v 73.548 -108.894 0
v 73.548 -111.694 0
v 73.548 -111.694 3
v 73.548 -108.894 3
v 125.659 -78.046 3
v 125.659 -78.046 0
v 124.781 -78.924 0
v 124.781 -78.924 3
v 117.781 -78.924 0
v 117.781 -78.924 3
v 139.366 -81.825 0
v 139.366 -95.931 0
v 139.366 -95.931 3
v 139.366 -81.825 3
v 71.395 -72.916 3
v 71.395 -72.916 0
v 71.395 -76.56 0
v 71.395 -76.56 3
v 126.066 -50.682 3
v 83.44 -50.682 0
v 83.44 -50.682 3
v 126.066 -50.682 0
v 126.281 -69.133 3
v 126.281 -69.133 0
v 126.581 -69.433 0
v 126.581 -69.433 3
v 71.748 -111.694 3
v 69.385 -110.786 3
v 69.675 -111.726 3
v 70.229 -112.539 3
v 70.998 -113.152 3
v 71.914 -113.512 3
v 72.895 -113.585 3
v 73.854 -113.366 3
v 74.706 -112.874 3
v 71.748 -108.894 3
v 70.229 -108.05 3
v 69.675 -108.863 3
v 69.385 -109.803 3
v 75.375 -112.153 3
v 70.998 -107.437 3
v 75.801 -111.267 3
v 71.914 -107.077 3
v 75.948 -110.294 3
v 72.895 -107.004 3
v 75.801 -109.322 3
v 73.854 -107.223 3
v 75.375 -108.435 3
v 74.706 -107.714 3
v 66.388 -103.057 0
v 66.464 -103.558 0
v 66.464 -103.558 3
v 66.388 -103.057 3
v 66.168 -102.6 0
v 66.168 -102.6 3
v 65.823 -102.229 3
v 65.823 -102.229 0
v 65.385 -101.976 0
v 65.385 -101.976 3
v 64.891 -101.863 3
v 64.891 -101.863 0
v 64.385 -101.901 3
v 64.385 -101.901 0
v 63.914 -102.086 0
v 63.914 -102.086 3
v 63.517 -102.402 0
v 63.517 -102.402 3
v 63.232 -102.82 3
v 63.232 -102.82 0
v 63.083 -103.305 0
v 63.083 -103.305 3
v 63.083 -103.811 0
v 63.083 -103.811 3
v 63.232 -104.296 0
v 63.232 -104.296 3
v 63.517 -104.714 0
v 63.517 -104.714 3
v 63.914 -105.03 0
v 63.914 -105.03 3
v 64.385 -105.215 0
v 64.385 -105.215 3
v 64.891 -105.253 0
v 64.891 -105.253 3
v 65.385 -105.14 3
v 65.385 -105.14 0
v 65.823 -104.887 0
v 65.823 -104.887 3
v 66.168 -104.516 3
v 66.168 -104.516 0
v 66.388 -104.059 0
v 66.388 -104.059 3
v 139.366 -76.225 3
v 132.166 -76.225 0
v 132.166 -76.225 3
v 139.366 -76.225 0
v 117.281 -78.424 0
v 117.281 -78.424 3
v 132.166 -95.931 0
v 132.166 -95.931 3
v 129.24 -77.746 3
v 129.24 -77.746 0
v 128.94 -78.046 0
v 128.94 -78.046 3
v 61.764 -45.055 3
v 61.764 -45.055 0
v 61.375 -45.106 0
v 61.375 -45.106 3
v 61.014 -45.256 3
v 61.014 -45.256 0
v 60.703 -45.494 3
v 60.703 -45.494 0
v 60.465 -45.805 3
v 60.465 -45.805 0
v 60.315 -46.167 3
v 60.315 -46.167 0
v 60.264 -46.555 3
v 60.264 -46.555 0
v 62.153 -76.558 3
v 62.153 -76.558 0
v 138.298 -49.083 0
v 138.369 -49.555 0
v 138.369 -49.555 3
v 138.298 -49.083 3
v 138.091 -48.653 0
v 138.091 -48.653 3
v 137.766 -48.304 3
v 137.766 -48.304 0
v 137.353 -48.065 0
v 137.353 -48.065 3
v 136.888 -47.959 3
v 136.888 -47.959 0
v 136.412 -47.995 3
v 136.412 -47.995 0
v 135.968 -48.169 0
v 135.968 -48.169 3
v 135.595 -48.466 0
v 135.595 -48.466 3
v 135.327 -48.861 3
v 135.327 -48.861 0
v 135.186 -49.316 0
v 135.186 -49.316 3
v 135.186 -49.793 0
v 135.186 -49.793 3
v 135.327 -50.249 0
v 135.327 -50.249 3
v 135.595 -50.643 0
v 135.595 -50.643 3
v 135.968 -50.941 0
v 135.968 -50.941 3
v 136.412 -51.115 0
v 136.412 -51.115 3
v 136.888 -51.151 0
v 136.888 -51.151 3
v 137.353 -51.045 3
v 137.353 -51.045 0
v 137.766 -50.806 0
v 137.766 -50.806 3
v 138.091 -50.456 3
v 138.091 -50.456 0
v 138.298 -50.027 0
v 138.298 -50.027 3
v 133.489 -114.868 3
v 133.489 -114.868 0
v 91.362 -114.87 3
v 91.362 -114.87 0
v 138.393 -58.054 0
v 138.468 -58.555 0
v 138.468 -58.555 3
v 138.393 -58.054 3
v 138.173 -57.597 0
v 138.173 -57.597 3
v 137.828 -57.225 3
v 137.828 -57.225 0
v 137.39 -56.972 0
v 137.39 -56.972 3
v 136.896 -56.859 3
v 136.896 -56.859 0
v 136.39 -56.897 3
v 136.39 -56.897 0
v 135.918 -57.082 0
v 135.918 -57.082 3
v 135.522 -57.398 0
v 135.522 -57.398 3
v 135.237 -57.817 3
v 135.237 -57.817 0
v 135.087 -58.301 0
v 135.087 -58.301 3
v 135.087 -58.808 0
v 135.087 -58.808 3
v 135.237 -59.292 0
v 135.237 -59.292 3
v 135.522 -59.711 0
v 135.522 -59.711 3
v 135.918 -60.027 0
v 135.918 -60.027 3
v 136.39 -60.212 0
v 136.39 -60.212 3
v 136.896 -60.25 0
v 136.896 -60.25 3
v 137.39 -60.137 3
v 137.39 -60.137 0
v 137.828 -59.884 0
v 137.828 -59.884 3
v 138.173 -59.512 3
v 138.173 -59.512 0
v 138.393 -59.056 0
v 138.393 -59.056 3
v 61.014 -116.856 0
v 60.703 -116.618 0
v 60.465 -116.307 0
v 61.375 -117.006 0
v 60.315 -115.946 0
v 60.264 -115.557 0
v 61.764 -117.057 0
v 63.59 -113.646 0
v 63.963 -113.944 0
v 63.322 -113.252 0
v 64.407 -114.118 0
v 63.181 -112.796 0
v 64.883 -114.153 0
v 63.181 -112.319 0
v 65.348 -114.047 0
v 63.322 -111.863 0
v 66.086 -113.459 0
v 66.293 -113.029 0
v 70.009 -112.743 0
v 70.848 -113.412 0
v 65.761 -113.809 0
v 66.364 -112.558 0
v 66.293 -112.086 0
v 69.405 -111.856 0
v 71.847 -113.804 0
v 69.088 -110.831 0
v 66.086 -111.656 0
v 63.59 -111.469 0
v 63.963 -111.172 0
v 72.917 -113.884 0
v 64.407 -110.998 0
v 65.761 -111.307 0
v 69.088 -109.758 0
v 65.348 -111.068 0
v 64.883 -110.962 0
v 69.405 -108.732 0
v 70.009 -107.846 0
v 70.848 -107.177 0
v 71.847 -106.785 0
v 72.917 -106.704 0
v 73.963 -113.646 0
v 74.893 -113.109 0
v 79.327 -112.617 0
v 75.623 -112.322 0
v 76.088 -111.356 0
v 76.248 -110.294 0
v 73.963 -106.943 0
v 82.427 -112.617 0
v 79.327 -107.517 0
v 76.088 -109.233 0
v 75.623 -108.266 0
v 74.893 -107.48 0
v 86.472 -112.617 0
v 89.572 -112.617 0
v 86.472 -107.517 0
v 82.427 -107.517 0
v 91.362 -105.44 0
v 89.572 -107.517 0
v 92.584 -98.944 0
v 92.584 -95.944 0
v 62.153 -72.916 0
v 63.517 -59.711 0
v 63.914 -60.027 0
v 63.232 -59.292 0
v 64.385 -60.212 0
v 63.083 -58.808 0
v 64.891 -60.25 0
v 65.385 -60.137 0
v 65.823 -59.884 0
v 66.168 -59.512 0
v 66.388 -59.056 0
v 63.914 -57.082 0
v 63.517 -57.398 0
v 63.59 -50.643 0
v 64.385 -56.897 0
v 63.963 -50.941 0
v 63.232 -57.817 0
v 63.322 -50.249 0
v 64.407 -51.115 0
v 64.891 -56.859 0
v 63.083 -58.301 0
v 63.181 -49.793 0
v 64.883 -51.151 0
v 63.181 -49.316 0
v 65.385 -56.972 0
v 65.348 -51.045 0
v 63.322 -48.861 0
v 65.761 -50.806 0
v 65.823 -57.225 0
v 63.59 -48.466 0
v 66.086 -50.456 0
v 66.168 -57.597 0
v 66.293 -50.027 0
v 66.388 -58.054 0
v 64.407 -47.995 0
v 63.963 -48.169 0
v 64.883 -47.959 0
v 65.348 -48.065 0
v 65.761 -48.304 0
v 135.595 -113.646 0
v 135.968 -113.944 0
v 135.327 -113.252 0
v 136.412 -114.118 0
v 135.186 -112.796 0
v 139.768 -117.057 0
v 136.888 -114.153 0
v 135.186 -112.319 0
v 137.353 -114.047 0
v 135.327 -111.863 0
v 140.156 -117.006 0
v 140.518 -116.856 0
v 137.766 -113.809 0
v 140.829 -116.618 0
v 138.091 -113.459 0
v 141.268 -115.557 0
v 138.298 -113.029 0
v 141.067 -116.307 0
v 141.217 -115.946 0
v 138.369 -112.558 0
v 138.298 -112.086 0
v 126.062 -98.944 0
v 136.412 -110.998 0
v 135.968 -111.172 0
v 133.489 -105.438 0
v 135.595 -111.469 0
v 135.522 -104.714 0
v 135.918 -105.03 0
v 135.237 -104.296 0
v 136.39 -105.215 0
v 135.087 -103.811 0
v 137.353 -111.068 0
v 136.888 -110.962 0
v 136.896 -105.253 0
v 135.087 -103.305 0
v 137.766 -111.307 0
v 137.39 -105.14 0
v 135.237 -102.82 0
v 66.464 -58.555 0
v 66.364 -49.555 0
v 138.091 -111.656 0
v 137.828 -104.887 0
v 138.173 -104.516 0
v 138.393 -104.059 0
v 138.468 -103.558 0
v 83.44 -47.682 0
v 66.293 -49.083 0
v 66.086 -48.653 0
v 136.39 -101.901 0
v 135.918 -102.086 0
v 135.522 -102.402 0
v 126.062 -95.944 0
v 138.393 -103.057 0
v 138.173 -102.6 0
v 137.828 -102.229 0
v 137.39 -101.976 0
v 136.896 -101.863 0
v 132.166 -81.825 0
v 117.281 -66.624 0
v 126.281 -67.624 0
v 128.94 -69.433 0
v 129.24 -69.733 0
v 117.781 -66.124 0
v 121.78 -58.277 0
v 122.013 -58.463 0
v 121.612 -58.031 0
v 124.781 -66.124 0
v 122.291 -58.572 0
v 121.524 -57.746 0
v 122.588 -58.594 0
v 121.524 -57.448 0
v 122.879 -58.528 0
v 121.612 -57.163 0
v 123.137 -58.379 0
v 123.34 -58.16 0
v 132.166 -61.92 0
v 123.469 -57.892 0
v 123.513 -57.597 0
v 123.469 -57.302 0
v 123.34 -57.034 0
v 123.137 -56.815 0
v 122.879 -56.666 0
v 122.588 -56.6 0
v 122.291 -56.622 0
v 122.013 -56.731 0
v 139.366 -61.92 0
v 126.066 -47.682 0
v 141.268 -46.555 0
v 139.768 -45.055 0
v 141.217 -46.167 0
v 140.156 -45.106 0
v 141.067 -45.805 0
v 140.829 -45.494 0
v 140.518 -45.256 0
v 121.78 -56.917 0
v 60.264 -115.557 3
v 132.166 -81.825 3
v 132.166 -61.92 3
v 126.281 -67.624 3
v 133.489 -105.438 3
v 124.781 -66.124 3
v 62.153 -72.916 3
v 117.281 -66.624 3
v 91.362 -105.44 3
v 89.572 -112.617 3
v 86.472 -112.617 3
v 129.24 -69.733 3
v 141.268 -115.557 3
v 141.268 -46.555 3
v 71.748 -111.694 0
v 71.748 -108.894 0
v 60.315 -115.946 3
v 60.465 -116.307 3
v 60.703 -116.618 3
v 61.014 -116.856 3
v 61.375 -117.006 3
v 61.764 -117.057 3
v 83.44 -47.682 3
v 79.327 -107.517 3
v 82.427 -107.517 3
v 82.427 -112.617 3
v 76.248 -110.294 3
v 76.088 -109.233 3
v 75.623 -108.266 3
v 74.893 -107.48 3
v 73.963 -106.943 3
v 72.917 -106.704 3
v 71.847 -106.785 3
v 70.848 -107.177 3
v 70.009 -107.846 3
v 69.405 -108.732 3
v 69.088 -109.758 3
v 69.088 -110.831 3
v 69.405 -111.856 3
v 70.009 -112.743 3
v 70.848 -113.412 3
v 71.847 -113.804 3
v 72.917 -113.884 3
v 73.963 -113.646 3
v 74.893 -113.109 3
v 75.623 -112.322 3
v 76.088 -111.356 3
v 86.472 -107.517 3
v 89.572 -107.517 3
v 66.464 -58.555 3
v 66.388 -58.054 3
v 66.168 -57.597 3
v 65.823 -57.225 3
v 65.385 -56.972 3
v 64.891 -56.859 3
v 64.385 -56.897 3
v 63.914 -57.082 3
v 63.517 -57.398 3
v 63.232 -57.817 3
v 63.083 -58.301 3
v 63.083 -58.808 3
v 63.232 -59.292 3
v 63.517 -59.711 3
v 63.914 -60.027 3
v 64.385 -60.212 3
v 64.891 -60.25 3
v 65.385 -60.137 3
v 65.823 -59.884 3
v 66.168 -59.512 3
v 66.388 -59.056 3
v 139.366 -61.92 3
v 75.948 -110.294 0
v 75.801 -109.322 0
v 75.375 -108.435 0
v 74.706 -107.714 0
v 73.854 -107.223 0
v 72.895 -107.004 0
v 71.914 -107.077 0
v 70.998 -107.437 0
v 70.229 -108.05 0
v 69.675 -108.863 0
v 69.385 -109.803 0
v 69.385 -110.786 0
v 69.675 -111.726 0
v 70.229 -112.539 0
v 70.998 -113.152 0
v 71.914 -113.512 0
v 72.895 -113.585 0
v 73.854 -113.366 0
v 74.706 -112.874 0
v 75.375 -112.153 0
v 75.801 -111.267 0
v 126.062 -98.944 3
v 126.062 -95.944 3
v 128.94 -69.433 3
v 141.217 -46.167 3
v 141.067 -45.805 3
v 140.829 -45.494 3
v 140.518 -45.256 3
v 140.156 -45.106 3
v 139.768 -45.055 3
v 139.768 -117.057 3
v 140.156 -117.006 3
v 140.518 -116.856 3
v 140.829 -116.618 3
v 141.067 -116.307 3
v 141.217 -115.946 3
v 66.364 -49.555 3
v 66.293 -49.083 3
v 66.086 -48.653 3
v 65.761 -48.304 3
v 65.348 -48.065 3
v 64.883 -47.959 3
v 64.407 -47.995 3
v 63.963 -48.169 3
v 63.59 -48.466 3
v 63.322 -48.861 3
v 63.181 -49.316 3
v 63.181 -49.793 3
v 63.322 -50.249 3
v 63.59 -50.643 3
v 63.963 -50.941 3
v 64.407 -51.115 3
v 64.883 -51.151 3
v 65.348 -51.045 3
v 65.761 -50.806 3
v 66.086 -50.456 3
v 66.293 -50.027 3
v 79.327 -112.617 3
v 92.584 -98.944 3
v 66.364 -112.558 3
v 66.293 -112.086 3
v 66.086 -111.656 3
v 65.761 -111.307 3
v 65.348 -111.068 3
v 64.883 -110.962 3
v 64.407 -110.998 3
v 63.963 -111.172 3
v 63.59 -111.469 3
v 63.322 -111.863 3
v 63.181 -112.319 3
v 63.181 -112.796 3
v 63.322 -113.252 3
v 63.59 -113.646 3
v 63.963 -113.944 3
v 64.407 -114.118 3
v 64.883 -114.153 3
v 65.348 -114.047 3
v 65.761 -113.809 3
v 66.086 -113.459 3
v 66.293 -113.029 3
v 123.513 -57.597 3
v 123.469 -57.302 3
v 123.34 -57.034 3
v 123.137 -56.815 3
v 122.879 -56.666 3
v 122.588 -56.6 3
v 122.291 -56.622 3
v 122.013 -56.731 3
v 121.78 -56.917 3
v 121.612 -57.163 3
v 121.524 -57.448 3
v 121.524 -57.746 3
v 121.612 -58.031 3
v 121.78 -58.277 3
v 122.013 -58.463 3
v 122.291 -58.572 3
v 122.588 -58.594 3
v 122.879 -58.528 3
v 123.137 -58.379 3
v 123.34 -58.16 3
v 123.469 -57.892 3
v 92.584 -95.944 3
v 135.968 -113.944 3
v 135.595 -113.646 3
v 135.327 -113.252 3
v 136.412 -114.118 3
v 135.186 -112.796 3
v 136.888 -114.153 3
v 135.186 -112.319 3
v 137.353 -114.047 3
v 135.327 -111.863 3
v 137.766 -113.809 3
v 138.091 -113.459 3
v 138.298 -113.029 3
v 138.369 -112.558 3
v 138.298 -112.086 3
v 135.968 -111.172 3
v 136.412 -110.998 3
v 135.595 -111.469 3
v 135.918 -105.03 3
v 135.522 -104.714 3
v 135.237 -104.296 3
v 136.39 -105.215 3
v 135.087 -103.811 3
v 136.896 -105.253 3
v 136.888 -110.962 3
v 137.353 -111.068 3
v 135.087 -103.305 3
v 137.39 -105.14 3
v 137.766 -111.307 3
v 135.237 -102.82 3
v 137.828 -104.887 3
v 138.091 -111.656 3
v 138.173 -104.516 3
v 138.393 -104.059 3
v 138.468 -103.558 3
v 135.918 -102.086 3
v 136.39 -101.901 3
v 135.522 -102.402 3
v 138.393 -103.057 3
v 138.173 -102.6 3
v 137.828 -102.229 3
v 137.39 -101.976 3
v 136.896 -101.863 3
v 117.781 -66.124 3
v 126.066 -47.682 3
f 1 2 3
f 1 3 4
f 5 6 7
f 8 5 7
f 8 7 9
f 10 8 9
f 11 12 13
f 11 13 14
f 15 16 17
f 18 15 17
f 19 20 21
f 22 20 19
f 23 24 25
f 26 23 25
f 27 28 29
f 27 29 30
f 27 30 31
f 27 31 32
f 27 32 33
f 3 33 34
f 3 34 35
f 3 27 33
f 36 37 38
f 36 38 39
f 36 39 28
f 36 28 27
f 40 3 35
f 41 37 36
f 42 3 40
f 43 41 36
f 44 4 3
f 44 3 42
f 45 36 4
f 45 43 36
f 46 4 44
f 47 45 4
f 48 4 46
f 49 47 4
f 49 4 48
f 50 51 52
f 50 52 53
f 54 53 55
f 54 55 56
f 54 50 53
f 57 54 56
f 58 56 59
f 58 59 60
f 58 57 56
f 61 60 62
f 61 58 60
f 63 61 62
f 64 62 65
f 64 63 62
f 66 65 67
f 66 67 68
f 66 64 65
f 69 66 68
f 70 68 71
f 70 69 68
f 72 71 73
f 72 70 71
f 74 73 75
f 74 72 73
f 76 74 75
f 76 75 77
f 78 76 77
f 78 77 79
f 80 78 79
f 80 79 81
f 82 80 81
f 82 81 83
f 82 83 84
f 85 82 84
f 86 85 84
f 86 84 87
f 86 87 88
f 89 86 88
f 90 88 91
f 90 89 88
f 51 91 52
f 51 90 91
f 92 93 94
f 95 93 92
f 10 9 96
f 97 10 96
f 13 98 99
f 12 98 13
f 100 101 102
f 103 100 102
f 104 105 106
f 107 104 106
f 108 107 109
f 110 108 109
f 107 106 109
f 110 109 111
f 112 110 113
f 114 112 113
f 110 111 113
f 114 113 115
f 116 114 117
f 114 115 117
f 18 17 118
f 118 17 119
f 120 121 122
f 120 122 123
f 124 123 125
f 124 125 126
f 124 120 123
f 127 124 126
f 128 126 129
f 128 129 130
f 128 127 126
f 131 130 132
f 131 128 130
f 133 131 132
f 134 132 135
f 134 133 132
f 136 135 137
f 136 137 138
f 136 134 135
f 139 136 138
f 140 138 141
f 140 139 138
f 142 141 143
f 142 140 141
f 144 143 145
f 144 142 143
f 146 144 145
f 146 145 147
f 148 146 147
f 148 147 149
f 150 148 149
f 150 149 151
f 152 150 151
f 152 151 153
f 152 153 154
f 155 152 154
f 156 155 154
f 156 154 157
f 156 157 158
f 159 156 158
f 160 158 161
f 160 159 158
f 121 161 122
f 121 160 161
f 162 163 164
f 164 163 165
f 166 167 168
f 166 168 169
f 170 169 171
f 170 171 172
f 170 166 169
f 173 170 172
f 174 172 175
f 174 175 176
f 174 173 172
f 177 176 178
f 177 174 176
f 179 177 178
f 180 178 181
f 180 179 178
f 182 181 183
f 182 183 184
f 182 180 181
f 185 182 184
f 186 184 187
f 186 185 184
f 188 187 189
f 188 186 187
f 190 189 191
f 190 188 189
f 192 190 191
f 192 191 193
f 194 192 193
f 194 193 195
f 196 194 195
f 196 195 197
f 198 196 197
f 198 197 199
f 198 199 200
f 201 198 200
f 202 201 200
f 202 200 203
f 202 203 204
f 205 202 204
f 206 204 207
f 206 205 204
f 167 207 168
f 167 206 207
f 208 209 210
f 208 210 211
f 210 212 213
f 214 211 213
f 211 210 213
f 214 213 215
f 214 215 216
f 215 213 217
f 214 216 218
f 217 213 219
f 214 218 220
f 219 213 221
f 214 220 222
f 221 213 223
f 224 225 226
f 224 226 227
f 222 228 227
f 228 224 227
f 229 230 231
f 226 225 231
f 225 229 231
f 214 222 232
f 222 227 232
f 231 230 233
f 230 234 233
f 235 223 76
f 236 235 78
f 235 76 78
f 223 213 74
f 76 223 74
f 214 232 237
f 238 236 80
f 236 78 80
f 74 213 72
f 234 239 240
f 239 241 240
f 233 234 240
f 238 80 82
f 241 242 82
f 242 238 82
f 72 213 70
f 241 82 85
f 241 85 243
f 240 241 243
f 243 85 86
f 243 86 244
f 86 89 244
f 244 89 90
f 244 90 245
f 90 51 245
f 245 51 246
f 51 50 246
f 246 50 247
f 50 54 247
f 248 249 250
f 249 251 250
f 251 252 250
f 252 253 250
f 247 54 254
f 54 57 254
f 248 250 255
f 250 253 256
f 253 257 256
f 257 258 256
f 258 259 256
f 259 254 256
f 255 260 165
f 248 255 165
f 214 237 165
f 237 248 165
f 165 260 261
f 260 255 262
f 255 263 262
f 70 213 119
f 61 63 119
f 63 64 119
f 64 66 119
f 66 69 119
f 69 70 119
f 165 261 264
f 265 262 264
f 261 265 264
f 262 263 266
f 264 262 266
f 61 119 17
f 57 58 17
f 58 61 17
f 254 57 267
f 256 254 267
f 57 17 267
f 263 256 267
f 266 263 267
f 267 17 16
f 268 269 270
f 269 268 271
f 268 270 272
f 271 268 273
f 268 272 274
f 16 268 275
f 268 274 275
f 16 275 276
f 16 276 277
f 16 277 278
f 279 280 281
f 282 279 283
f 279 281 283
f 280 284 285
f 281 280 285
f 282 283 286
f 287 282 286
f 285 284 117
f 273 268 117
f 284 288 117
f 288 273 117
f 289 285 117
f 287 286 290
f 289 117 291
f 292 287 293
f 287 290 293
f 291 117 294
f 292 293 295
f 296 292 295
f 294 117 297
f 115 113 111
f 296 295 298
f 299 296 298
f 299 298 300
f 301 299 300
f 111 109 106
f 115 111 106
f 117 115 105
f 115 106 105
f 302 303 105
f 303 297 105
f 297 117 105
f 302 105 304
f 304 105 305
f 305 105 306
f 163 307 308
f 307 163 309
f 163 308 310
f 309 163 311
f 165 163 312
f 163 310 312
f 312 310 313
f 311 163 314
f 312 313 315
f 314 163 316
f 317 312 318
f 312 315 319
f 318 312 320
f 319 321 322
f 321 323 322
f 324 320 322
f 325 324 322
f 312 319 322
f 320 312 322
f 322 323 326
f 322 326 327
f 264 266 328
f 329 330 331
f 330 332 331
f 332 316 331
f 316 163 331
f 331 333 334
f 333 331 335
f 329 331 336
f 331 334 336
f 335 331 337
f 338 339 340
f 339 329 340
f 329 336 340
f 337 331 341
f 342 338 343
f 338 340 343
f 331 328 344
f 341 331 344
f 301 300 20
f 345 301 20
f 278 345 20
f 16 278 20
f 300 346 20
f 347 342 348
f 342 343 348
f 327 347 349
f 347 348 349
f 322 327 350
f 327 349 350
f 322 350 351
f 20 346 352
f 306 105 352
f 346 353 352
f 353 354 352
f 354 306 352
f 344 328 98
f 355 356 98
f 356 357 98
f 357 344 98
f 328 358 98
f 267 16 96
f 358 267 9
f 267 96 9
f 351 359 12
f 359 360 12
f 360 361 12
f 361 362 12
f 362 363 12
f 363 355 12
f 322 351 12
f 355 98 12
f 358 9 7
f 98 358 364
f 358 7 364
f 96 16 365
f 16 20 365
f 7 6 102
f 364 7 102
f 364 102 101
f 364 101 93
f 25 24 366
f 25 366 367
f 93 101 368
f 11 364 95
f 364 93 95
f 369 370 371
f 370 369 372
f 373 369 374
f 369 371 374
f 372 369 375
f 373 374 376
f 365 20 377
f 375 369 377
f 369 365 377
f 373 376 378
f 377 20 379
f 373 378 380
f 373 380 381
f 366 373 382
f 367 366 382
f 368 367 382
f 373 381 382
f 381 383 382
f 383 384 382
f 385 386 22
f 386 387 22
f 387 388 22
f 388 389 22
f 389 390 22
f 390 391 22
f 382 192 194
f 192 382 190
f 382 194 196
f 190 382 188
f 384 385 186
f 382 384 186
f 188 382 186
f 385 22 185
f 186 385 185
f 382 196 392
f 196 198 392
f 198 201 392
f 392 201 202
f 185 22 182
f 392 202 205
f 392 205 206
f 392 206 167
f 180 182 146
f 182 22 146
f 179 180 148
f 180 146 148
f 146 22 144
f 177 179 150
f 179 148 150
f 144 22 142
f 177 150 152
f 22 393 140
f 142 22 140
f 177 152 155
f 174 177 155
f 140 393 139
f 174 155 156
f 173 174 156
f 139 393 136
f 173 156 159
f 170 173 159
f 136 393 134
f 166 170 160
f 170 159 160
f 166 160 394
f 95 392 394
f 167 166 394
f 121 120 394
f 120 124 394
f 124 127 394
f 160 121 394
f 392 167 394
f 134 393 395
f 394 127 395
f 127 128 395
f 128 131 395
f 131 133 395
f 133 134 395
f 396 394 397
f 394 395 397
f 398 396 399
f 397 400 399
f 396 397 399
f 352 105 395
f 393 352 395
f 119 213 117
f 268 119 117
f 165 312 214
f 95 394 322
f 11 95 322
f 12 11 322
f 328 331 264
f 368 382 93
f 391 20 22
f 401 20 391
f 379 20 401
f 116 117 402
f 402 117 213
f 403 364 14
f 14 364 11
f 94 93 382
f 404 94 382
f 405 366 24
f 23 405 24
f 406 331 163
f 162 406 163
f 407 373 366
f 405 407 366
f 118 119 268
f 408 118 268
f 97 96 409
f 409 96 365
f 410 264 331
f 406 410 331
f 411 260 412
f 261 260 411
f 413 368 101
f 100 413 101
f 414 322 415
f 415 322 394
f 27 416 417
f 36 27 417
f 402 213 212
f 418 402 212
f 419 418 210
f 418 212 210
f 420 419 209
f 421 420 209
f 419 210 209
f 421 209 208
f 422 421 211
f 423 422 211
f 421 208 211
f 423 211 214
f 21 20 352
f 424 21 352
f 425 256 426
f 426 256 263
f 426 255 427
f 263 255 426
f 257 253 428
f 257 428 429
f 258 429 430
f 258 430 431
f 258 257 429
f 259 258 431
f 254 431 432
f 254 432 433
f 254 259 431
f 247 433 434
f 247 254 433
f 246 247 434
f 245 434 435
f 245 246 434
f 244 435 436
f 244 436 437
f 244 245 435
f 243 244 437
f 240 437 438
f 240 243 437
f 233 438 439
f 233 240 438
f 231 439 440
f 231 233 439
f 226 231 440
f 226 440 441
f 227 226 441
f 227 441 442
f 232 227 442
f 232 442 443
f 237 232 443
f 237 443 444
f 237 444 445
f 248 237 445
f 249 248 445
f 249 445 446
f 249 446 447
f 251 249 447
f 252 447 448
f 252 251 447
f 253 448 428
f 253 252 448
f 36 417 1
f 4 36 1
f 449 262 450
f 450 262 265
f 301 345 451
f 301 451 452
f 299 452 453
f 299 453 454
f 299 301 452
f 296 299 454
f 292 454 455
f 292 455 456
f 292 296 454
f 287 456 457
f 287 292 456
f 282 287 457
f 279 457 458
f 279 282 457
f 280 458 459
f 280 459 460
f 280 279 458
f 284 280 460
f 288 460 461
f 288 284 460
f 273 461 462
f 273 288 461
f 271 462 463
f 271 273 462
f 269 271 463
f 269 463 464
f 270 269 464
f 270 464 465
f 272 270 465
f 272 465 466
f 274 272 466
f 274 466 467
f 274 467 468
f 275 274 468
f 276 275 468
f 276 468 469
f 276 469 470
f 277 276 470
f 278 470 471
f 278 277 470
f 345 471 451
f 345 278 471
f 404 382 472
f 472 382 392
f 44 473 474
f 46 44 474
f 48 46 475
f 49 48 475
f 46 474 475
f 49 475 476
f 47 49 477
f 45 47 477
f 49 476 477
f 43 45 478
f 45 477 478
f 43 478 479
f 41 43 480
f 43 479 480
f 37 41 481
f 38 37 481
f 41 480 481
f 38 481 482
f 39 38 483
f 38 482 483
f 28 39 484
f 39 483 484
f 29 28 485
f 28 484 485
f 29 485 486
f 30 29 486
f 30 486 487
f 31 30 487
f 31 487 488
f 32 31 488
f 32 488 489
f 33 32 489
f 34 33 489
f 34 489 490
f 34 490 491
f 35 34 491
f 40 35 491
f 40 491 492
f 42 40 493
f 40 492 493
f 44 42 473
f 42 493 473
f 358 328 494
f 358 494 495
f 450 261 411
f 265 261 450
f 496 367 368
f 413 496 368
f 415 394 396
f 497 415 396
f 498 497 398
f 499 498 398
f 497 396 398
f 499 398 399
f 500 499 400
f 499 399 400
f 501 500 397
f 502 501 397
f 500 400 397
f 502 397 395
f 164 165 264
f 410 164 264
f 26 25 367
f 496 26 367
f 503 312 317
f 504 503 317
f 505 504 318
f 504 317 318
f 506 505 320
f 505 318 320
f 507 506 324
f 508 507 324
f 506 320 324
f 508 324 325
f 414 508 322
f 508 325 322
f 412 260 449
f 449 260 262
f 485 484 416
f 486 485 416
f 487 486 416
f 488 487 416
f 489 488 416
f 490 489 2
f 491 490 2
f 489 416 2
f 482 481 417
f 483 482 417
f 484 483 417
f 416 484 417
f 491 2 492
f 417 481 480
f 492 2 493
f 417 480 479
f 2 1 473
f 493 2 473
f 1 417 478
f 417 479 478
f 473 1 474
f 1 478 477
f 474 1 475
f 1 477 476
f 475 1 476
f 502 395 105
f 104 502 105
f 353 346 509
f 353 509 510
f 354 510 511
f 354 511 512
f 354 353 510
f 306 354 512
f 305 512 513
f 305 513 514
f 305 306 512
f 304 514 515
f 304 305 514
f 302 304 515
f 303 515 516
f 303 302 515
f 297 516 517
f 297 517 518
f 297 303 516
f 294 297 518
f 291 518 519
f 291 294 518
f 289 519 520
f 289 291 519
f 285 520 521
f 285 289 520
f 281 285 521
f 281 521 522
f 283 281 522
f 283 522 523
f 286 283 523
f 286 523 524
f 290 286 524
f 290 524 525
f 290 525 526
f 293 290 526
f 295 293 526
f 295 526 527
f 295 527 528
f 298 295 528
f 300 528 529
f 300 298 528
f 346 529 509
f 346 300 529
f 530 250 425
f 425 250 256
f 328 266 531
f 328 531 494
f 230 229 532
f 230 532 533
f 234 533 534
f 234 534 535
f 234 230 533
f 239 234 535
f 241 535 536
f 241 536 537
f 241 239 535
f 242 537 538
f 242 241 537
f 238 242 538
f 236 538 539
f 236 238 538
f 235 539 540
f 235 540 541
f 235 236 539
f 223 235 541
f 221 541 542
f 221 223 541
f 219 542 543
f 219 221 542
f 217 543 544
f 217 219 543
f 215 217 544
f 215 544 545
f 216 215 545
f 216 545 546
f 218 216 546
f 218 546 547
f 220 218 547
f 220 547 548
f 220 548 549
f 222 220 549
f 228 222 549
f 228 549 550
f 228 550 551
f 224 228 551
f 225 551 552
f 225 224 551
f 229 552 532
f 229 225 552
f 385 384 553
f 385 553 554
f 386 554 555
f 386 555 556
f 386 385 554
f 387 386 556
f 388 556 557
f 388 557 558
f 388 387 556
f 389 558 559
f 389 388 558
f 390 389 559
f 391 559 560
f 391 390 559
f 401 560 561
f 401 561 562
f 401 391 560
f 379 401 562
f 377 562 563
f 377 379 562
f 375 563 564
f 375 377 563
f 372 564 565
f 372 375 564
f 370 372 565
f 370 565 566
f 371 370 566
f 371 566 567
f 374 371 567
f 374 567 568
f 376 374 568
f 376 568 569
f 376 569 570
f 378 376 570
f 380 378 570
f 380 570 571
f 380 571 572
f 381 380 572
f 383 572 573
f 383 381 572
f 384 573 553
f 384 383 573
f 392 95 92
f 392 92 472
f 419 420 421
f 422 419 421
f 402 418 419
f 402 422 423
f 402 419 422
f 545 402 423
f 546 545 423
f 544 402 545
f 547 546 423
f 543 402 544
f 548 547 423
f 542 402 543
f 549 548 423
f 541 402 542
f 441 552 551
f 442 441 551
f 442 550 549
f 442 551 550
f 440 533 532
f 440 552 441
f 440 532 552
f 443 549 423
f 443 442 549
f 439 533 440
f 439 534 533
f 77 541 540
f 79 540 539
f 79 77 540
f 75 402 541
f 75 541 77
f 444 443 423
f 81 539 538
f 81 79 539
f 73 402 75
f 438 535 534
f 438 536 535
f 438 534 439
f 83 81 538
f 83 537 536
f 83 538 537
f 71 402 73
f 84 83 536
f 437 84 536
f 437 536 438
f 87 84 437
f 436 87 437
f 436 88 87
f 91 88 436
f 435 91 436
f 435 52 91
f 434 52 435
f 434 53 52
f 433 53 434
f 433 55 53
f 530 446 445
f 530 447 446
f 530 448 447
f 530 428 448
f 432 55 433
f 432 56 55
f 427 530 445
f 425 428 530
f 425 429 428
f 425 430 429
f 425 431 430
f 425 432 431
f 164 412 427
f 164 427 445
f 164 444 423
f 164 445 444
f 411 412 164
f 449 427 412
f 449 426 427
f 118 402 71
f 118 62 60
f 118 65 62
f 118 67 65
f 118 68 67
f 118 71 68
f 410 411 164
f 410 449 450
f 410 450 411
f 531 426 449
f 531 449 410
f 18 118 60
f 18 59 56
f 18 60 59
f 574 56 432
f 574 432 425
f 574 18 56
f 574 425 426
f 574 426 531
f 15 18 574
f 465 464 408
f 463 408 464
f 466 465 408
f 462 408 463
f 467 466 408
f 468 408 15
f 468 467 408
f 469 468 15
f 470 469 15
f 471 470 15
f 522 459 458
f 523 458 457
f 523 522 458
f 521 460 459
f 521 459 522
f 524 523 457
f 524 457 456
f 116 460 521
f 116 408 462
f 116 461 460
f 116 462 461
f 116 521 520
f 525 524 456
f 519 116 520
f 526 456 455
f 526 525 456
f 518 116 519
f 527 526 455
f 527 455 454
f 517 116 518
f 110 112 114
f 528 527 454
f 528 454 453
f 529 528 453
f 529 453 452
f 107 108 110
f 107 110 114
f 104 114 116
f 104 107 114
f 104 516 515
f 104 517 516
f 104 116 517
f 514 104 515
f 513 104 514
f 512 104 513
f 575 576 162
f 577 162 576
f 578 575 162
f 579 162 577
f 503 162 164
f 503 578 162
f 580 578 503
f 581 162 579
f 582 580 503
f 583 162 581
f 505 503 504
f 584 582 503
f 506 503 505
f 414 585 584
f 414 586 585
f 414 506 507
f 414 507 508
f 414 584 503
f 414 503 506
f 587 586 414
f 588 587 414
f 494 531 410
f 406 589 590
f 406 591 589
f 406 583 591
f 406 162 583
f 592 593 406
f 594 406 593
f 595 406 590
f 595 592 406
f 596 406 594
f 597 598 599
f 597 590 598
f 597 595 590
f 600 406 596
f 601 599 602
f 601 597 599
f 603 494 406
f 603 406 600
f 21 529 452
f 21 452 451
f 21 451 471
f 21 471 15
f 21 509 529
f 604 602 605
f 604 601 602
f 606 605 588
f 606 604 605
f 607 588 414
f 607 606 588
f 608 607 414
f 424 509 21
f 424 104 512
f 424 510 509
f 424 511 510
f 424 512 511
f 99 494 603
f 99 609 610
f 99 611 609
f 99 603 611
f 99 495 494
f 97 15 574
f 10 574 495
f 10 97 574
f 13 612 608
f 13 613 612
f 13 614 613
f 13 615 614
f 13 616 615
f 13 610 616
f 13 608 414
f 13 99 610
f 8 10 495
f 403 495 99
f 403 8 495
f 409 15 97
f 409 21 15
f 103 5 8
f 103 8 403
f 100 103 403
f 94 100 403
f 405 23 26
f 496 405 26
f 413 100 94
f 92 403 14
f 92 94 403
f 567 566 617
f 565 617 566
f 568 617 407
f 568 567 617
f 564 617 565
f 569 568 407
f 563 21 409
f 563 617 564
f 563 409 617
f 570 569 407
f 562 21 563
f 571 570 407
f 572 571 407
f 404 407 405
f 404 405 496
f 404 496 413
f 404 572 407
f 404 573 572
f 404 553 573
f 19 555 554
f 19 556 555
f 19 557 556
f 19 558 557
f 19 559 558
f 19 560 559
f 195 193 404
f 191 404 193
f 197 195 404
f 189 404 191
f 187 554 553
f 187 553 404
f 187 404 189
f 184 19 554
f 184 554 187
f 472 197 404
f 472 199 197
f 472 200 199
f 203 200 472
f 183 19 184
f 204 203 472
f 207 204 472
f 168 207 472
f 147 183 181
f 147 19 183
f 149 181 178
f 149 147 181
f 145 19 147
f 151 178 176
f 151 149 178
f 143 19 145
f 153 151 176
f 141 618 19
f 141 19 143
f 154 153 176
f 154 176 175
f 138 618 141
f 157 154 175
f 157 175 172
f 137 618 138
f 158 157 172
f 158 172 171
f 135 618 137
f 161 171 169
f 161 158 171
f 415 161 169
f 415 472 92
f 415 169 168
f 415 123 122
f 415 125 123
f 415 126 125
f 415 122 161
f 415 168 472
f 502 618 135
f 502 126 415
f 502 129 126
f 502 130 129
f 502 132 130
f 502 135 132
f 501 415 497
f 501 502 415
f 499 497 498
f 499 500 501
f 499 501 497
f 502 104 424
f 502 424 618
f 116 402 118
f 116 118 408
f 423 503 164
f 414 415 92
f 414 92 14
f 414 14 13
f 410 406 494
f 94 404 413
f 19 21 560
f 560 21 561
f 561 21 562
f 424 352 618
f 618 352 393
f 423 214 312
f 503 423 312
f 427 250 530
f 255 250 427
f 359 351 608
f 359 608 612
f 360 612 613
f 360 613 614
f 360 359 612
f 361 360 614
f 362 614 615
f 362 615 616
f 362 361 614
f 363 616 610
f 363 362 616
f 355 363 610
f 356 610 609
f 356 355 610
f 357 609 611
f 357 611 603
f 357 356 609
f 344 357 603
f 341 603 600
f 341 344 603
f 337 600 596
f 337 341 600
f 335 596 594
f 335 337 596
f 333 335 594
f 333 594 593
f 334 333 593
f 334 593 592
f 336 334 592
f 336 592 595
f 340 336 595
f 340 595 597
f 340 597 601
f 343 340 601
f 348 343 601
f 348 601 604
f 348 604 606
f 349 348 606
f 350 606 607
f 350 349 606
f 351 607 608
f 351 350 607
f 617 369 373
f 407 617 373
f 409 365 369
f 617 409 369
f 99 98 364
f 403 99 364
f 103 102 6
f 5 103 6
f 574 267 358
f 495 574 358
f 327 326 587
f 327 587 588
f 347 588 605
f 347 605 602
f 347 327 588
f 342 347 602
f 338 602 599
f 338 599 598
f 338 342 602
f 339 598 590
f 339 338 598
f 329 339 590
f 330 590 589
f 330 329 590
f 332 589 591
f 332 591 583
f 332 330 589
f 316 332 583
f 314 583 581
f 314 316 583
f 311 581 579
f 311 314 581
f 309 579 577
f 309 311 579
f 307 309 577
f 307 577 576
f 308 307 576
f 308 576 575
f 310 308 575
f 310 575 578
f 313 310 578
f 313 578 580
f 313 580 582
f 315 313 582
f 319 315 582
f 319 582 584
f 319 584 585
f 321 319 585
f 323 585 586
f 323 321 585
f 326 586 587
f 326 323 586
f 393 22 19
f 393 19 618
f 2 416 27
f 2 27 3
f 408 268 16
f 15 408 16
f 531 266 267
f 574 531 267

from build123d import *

# Parameters (mm, degrees)
MODEL_R                   = 1.600279216
MODEL_R_2                 = 3.6
MODEL_R_3                 = 1.7
MODEL_W                   = 3.1
MODEL_H                   = 5.1
MODEL_W_2                 = 33.477610829
MODEL_H_2                 = 3
MODEL_W_3                 = 7.19993206
MODEL_H_3                 = 14.105297
MODEL_H_4                 = 14.305297001
MODEL_W_4                 = 42.625961549
MODEL_R_4                 = 1
SALIENTE_EXTRUIR1_DEPTH   = 3
MODEL_R_5                 = 3.3
MODEL_W_5                 = 1.8
MODEL_H_5                 = 2.8
SALIENTE_EXTRUIR1_2_DEPTH = 3


with BuildPart() as part:
    # Model → Saliente-Extruir1 (new body)
    with BuildSketch(Plane.XY):
        with BuildLine():
            ThreePointArc((141.268153306, -46.554934941), (140.828813478, -45.494274769), (139.768153306, -45.054934941))
            Line((139.768153306, -45.054934941), (61.763543448, -45.054934941))
            ThreePointArc((61.763543448, -45.054934941), (60.702883276, -45.494274769), (60.263543448, -46.554934941))
            Line((60.263543448, -46.554934941), (60.263543448, -115.557339175))
            ThreePointArc((60.263543448, -115.557339175), (60.702883276, -116.617999347), (61.763543448, -117.057339175))
            Line((61.763543448, -117.057339175), (139.768153306, -117.057339175))
            ThreePointArc((139.768153306, -117.057339175), (140.828813478, -116.617999347), (141.268153306, -115.557339175))
            Line((141.268153306, -115.557339175), (141.268153306, -46.554934941))
        make_face()
        with Locations((64.763543448, -112.557673677)):
            Circle(MODEL_R, mode=Mode.SUBTRACT)
        with Locations((72.648093746, -110.294421642)):
            Circle(MODEL_R_2, mode=Mode.SUBTRACT)
        with Locations((64.763543448, -103.558008179)):
            Circle(MODEL_R_3, mode=Mode.SUBTRACT)
        with Locations((80.876831082, -110.067080389)):
            Rectangle(MODEL_W, MODEL_H, mode=Mode.SUBTRACT)
        with Locations((88.022204789, -110.067080389)):
            Rectangle(MODEL_W, MODEL_H, mode=Mode.SUBTRACT)
        Polygon((133.488780706, -114.868405375), (91.361604845, -114.869675438), (91.361604845, -105.439698172), (133.488780706, -105.438428109), align=None, mode=Mode.SUBTRACT)
        with Locations((136.768487808, -112.557673677)):
            Circle(MODEL_R, mode=Mode.SUBTRACT)
        with Locations((136.768487808, -103.558008179)):
            Circle(MODEL_R_3, mode=Mode.SUBTRACT)
        with Locations((109.323020283, -97.443925522)):
            Rectangle(MODEL_W_2, MODEL_H_2, mode=Mode.SUBTRACT)
        with Locations((135.766408204, -88.877958573)):
            Rectangle(MODEL_W_3, MODEL_H_3, mode=Mode.SUBTRACT)
        Polygon((71.39528321, -72.915924132), (71.39528321, -76.559558928), (62.152822733, -76.557988576), (62.152822733, -72.915924132), align=None, mode=Mode.SUBTRACT)
        with Locations((64.763543448, -58.554600438)):
            Circle(MODEL_R_3, mode=Mode.SUBTRACT)
        with Locations((64.763543448, -49.554934941)):
            Circle(MODEL_R, mode=Mode.SUBTRACT)
        Polygon((117.280814174, -66.624021947), (117.780814174, -66.124021947), (124.780814174, -66.124021947), (126.280814174, -67.624021947), (126.280814174, -69.133016861), (126.580814174, -69.433016861), (128.940476156, -69.433016861), (129.240476156, -69.733016861), (129.240476156, -77.746209187), (128.940476156, -78.046209187), (125.658626934, -78.046209187), (124.780814174, -78.924021947), (117.780814174, -78.924021947), (117.280814174, -78.424021947), align=None, mode=Mode.SUBTRACT)
        with Locations((135.766408204, -69.072591195)):
            Rectangle(MODEL_W_3, MODEL_H_4, mode=Mode.SUBTRACT)
        with Locations((104.752742978, -49.181536457)):
            Rectangle(MODEL_W_4, MODEL_H_2, mode=Mode.SUBTRACT)
        with Locations((122.513302154, -57.596973034)):
            Circle(MODEL_R_4, mode=Mode.SUBTRACT)
        with Locations((136.768487808, -58.554600438)):
            Circle(MODEL_R_3, mode=Mode.SUBTRACT)
        with Locations((136.768487808, -49.554934941)):
            Circle(MODEL_R, mode=Mode.SUBTRACT)
    extrude(amount=SALIENTE_EXTRUIR1_DEPTH)


with BuildPart() as body_2:
    # Model → Saliente-Extruir1 2 (new body)
    with BuildSketch(Plane.XY):
        with Locations((72.648093746, -110.294421642)):
            Circle(MODEL_R_5)
        with Locations((72.648093746, -110.294421642)):
            Rectangle(MODEL_W_5, MODEL_H_5, mode=Mode.SUBTRACT)
    extrude(amount=SALIENTE_EXTRUIR1_2_DEPTH)


solid = Compound([part.part, body_2.part])
